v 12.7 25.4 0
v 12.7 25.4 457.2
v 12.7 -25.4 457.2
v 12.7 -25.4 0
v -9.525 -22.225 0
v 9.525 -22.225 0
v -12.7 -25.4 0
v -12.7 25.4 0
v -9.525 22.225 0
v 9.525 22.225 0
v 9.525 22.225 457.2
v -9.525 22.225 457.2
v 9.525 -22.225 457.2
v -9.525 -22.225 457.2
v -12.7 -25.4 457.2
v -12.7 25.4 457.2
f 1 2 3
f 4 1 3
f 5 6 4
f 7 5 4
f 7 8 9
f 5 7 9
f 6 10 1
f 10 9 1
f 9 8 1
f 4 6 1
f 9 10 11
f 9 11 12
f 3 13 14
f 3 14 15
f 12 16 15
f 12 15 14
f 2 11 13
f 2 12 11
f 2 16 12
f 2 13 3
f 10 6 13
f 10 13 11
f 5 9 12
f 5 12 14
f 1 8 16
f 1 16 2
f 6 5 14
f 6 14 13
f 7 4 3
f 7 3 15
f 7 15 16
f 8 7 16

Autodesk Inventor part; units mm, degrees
ref_plane "YZ Plane" through (0, 0, 0) normal (1, 0, 0) x (0, 1, 0)
ref_plane "XZ Plane" through (0, 0, 0) normal (0, 1, 0) x (-1, 0, 0)
ref_plane "XY Plane" through (0, 0, 0) normal (0, 0, 1) x (1, 0, 0)
sketch "Sketch1" plane through (0, 0, 0) normal (0, 0, 1) x (1, 0, 0)
  line L0 (-12.7, 25.4) -> (12.7, 25.4)
  line L1 (12.7, 25.4) -> (12.7, -25.4)
  line L2 (12.7, -25.4) -> (-12.7, -25.4)
  line L3 (-12.7, -25.4) -> (-12.7, 25.4)
  line L4 (9.525, 22.225) -> (-9.525, 22.225)
  line L5 (-9.525, 22.225) -> (-9.525, -22.225)
  line L6 (-9.525, -22.225) -> (9.525, -22.225)
  line L7 (9.525, -22.225) -> (9.525, 22.225)
  point P0 (0, 0)
  point P1 (0, 0)
  point P2 (0, 25.4)
  point P3 (-12.7, 0)
extrude "Extrusion1" add sketch "Sketch1" along normal blind 457.2
properties part number "Aluminum Box Tube" material "Aluminum 6061"
